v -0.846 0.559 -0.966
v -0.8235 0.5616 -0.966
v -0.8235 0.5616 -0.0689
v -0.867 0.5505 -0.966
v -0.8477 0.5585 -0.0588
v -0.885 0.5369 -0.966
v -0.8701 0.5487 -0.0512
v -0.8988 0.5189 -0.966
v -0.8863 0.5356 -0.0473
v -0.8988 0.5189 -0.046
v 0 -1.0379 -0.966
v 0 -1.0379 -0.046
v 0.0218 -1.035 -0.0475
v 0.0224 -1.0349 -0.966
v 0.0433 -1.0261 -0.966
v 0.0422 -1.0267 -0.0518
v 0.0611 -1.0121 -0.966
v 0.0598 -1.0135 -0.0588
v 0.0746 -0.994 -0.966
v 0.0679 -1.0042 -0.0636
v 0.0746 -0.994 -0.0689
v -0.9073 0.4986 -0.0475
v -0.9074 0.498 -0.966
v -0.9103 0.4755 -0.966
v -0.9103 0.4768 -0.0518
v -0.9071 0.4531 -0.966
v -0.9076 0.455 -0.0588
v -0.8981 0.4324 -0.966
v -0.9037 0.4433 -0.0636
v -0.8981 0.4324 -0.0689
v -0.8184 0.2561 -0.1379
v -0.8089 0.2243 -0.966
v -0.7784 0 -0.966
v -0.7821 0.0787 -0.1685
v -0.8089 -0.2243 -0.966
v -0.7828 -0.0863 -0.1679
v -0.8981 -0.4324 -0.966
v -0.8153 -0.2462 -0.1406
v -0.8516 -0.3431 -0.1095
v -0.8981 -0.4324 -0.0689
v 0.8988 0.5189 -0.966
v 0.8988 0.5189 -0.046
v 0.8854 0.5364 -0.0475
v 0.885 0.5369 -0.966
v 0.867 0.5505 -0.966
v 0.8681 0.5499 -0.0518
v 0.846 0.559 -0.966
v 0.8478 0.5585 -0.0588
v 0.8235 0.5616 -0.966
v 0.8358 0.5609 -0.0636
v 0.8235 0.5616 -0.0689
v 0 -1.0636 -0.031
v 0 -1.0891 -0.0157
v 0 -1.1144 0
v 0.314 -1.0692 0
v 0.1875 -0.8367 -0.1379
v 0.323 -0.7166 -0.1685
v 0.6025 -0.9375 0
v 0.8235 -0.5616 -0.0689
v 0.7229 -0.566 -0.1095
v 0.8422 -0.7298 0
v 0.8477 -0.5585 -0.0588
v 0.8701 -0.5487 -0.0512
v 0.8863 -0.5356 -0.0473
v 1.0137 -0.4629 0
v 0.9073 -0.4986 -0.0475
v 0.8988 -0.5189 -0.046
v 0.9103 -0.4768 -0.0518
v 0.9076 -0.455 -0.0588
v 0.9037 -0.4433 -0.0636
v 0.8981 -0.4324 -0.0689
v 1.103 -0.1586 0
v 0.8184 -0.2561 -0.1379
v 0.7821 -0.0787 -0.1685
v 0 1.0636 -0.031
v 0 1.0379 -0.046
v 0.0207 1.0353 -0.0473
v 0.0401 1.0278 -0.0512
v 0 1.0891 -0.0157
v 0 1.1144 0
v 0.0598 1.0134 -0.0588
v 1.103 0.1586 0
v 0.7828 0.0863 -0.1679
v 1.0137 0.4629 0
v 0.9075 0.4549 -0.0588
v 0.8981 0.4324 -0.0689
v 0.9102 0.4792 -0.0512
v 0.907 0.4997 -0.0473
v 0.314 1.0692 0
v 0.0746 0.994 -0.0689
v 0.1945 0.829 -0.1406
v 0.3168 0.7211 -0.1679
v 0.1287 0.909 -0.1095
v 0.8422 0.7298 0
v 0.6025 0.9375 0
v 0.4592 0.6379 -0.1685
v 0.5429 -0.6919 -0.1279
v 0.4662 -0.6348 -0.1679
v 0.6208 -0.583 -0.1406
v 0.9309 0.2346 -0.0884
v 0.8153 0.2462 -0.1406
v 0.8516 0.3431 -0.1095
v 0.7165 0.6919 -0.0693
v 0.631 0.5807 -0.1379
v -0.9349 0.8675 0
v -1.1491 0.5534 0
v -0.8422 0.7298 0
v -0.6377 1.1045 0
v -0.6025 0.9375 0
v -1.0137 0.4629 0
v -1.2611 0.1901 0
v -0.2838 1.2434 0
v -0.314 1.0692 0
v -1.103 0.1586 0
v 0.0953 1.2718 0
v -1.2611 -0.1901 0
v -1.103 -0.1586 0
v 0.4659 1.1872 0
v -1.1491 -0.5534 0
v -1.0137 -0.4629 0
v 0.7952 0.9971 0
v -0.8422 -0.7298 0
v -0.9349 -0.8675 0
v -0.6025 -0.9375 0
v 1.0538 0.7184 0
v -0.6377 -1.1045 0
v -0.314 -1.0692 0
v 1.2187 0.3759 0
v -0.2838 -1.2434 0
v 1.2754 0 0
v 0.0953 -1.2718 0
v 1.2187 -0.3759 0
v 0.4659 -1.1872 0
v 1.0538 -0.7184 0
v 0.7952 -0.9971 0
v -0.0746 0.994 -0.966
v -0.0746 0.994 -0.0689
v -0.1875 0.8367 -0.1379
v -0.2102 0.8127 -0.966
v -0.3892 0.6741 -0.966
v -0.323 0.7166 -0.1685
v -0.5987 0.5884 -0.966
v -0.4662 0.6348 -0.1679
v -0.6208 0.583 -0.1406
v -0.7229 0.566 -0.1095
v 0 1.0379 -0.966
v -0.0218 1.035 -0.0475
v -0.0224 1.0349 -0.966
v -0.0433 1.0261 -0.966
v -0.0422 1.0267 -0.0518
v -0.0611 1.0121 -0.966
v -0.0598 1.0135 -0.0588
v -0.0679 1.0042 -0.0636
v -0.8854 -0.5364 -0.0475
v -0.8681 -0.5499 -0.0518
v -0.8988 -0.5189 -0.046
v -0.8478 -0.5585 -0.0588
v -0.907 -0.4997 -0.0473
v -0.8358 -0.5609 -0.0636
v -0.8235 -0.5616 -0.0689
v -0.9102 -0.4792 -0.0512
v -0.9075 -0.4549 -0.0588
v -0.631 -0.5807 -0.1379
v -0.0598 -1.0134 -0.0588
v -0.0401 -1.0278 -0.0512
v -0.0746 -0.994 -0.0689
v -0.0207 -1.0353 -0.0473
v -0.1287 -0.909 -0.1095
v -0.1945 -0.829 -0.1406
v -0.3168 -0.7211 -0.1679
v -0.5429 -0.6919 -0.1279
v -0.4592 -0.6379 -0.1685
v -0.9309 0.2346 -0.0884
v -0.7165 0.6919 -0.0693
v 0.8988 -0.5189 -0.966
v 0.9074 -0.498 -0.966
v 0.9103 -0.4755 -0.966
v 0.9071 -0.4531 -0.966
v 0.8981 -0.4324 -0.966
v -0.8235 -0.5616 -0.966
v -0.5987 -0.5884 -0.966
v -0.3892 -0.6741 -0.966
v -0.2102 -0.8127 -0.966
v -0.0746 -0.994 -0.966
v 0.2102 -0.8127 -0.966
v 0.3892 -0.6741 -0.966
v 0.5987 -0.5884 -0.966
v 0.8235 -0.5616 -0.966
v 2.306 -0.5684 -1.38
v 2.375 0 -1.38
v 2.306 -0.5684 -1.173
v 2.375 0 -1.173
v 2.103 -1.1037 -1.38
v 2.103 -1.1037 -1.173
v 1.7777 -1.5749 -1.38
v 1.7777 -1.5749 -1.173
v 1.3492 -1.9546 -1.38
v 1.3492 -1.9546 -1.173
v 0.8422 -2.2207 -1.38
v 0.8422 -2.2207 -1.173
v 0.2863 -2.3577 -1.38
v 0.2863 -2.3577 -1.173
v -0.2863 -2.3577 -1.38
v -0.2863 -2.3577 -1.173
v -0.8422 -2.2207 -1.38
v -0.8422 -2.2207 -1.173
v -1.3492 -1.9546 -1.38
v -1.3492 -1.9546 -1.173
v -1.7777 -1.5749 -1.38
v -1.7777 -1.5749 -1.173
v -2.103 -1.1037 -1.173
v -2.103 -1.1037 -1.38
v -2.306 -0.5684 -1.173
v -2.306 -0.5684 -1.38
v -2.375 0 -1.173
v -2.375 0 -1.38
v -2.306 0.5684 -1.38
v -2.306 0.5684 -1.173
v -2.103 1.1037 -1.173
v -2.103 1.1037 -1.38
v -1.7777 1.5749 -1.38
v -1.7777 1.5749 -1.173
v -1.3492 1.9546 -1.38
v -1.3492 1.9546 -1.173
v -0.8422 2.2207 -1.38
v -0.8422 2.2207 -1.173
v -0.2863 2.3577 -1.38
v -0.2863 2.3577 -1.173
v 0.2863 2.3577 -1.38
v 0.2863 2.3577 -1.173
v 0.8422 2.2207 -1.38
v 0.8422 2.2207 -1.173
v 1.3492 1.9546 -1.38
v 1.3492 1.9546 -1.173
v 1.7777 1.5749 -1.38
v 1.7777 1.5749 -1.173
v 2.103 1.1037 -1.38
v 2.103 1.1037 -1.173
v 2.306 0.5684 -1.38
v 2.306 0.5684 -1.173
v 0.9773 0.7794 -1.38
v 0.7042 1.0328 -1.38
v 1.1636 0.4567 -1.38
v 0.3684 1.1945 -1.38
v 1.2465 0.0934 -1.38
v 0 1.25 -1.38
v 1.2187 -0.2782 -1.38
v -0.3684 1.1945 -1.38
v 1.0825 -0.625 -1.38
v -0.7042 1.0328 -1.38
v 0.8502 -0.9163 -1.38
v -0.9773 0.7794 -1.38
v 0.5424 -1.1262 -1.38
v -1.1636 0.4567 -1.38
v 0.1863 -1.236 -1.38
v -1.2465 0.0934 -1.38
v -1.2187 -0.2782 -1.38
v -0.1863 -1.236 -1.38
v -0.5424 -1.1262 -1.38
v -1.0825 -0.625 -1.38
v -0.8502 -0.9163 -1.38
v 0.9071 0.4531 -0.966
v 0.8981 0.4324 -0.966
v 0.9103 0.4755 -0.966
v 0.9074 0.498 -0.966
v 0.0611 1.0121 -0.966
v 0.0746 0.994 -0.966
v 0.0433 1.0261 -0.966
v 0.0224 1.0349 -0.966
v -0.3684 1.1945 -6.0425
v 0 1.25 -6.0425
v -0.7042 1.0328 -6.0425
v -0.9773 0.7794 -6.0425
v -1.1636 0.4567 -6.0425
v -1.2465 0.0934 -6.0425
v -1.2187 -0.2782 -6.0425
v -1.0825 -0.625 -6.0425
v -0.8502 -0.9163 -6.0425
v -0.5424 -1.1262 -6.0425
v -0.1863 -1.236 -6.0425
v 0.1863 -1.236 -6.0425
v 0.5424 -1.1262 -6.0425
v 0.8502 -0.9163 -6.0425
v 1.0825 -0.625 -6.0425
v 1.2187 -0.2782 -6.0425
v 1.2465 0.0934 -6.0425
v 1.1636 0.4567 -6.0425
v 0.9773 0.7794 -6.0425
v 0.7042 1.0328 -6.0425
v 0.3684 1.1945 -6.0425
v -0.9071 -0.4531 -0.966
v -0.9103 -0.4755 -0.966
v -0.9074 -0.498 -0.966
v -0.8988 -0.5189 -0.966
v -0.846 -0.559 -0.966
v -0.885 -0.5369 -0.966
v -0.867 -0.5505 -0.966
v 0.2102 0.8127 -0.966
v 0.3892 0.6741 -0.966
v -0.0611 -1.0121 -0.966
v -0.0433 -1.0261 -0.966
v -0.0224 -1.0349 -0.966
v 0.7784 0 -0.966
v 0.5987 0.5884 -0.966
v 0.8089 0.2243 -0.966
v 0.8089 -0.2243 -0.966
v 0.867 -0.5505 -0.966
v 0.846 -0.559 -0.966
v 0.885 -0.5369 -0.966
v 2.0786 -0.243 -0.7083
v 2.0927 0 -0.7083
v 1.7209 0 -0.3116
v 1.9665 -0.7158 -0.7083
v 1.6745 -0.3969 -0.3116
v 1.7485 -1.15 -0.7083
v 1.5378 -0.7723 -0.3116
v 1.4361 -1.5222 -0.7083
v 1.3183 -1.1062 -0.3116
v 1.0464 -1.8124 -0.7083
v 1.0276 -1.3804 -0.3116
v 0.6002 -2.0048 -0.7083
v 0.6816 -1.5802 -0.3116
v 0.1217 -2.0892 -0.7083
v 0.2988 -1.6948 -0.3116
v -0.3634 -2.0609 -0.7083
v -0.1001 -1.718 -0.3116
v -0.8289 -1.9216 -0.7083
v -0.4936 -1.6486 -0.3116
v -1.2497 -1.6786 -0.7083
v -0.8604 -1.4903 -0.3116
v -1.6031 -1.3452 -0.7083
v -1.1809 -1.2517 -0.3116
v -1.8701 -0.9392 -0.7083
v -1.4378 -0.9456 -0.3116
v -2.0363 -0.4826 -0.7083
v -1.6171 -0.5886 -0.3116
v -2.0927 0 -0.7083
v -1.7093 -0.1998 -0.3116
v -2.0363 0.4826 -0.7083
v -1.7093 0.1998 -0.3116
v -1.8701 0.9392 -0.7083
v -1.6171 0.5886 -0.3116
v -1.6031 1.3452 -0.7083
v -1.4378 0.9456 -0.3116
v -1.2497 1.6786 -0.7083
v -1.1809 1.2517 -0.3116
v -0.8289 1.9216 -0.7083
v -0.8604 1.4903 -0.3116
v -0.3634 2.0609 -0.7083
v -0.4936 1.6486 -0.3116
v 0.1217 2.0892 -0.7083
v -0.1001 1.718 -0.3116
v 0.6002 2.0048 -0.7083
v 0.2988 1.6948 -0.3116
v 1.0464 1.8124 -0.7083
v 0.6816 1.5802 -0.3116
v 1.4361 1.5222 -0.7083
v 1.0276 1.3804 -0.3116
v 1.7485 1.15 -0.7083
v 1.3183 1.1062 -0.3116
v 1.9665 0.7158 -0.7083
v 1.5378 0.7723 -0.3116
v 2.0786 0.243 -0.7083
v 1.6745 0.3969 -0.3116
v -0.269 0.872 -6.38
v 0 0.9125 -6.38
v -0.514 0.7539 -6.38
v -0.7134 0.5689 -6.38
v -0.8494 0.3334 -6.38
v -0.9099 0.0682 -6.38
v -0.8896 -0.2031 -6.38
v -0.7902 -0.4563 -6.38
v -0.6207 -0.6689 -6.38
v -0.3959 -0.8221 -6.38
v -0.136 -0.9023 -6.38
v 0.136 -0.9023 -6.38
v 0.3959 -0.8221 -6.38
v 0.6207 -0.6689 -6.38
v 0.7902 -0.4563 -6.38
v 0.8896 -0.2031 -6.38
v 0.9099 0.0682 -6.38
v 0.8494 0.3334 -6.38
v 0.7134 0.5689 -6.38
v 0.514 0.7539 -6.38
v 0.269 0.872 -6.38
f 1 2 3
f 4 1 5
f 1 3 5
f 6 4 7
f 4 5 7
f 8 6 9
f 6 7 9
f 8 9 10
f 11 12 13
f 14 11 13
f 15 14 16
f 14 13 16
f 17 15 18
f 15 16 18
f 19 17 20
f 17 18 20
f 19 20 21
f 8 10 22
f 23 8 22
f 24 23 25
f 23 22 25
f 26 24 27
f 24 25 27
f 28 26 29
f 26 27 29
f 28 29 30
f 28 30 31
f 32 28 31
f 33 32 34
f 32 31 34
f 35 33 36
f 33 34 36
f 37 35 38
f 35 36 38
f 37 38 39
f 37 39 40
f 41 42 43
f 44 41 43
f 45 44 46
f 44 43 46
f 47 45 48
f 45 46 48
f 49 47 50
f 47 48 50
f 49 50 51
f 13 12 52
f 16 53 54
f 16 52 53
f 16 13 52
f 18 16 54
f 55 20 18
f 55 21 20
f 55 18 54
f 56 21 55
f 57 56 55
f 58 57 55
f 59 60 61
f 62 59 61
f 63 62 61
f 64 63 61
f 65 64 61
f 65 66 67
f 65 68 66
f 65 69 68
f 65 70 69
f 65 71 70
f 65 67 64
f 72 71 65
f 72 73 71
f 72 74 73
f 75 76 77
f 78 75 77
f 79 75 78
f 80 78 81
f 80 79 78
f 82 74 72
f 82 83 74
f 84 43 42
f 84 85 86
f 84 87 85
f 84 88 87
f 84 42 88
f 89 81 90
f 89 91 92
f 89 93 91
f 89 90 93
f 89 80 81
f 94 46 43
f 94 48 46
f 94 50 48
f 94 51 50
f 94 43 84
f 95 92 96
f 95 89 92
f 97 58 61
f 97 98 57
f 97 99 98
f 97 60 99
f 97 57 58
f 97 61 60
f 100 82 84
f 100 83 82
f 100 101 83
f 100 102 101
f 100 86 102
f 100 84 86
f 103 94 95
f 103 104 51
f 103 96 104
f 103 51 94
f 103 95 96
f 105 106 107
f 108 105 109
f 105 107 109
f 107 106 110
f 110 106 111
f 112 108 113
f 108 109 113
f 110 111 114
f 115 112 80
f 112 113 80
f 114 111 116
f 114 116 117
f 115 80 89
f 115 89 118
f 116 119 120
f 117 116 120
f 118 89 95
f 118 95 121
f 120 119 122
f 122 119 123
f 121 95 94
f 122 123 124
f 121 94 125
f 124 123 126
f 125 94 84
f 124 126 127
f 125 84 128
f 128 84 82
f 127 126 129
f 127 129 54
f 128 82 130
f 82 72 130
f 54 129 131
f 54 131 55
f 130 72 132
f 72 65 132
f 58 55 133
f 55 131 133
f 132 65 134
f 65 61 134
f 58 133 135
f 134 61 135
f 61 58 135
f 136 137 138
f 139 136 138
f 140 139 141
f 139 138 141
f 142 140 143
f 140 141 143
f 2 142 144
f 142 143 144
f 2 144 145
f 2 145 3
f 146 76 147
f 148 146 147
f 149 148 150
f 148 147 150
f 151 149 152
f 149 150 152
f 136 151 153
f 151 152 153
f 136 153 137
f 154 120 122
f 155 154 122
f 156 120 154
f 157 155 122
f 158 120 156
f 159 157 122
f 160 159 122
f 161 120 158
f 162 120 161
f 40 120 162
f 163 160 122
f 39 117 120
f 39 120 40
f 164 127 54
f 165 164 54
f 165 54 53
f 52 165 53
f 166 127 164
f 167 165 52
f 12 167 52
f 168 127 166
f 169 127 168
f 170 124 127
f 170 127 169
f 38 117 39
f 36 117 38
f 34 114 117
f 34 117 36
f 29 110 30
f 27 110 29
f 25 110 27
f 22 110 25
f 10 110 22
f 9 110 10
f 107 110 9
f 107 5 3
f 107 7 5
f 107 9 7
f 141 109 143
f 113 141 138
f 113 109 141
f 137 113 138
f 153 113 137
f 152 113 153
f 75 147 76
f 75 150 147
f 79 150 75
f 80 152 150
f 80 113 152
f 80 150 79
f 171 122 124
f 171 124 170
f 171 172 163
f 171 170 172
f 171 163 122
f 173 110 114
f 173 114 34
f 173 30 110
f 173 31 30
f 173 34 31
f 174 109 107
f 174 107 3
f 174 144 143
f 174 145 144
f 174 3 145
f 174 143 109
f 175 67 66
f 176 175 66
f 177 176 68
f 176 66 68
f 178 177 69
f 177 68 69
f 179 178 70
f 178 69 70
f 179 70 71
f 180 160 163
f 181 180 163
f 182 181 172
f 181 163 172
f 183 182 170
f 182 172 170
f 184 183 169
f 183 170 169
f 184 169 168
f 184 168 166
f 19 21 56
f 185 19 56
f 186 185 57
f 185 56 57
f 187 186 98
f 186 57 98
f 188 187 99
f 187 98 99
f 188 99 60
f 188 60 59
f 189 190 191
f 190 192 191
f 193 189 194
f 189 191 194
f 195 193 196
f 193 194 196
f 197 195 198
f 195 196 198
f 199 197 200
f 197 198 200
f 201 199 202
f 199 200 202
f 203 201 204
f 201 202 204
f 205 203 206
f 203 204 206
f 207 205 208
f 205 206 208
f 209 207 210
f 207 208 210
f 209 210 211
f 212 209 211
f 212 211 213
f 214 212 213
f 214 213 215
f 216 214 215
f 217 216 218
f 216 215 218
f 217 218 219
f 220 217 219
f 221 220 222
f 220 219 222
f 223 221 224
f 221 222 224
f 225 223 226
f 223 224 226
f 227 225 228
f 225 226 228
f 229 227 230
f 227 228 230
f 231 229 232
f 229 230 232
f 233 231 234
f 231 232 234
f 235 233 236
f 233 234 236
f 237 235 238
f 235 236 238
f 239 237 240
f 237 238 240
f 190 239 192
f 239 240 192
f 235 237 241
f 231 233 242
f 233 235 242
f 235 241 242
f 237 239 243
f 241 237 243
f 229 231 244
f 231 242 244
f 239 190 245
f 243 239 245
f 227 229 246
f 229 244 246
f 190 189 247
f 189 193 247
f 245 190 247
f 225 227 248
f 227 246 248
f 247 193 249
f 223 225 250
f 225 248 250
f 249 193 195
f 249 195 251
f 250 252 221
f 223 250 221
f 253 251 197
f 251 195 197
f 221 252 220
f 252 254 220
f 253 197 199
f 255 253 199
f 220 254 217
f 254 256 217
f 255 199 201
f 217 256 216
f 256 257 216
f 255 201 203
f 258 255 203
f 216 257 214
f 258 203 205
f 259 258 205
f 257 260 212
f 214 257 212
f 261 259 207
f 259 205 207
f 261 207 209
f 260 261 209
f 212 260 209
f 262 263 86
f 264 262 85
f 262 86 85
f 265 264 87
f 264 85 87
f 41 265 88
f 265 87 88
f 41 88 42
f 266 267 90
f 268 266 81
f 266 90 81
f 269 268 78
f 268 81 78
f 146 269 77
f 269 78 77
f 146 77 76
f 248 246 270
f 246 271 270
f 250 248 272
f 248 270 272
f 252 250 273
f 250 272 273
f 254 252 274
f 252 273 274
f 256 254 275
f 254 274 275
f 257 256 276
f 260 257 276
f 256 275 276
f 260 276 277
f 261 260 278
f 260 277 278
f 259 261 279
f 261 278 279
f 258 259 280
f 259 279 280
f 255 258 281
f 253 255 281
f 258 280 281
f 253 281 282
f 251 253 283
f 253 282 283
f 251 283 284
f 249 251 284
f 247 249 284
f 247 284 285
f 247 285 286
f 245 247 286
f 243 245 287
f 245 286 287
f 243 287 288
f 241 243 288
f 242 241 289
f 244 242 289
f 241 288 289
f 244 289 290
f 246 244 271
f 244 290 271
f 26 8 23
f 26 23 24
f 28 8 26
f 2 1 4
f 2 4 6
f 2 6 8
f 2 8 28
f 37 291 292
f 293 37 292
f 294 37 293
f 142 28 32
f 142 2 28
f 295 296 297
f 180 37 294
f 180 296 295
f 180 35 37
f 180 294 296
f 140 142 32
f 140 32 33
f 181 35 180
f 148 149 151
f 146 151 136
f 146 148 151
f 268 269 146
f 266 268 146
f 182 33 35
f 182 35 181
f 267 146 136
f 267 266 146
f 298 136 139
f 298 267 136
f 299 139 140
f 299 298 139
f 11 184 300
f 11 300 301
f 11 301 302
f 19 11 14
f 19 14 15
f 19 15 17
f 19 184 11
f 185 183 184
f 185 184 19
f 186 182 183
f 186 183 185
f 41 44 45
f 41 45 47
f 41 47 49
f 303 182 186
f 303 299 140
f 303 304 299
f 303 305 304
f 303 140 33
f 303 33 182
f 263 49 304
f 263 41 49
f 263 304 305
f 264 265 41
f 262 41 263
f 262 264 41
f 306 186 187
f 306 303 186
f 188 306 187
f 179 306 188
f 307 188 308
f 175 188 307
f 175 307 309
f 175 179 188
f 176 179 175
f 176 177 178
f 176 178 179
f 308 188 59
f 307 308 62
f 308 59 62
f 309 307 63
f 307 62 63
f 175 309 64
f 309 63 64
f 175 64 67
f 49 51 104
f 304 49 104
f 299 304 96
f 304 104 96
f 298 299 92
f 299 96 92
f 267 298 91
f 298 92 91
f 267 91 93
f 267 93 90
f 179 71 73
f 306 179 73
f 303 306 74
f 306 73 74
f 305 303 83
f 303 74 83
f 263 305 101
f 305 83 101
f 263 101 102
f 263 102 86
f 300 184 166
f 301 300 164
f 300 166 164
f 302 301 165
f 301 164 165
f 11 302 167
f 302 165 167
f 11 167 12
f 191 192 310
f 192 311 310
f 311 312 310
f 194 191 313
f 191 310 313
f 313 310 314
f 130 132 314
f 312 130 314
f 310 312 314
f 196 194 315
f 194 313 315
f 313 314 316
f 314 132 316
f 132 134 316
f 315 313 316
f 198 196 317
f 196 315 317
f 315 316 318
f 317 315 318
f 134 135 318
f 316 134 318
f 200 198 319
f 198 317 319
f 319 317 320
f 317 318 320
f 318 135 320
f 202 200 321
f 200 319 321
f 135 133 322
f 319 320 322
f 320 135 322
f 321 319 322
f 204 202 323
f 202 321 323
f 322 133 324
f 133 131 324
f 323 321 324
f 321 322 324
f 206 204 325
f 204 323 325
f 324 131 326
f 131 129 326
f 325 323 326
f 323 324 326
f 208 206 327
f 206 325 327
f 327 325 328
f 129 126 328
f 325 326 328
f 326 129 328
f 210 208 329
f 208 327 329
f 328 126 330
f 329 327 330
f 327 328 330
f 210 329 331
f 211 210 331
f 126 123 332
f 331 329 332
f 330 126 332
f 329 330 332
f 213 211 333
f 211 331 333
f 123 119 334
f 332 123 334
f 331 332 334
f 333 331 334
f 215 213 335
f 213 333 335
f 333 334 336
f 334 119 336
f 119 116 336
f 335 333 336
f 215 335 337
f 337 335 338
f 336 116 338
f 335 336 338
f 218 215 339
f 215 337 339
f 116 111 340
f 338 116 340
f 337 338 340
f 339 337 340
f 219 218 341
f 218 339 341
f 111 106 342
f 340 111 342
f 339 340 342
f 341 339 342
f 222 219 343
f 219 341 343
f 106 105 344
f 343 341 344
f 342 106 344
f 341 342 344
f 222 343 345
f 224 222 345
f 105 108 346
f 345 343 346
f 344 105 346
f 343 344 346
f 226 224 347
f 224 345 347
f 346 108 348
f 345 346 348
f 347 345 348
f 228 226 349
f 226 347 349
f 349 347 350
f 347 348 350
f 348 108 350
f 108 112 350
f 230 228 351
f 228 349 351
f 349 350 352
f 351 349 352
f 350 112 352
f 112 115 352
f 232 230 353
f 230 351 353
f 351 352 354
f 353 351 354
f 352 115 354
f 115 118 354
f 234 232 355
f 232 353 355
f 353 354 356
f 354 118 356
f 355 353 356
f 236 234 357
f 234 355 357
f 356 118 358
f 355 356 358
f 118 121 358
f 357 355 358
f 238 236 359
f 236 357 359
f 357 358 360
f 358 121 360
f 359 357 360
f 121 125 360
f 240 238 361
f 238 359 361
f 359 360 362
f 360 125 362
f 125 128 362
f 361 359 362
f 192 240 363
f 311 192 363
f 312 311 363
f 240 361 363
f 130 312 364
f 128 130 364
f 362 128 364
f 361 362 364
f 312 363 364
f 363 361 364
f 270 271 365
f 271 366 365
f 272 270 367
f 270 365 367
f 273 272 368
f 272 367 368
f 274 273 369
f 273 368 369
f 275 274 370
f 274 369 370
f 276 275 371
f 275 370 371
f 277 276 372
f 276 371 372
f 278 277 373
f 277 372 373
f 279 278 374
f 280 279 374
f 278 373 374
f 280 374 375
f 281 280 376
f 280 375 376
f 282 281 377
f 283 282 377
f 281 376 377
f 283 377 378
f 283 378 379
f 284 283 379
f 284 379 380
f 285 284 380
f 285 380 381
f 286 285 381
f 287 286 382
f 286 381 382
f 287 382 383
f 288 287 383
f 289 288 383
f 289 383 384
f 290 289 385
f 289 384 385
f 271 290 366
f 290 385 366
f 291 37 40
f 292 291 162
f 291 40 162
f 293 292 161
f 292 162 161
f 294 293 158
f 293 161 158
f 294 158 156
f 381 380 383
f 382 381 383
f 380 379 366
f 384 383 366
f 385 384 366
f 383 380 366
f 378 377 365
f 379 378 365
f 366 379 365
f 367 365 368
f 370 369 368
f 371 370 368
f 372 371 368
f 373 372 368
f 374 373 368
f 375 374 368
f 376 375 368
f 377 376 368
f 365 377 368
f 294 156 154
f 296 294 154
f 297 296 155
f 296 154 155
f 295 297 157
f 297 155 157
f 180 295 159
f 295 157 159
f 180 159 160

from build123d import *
from build123d.topology import SkipClean

# Parameters (mm, degrees)
CUT_EXTRUDE1_DEPTH = 0.966
CIRPATTERN1_COUNT  = 6


with BuildPart() as part:
    # Sketch2 → Revolve1 (revolve)
    with BuildSketch(Plane(origin=(0, 0, 0), x_dir=(0, 0, -1), z_dir=(1, 0, 0))):
        Polygon((1.38, 1.25), (6.0425, 1.25), (6.38, 0.9125), (6.38, 0), (1.38, 0), align=None)
    revolve(axis=Axis((0, 0, -6.38), (0, 0, 1)))


with BuildPart() as body_2:
    # Sketch3 → Revolve2 (revolve)
    with BuildSketch(Plane(origin=(0, 0, 0), x_dir=(0, 0, -1), z_dir=(1, 0, 0))):
        with BuildLine():
            Line((1.38, 0), (1.38, 2.375))
            Line((1.38, 2.375), (1.173, 2.375))
            ThreePointArc((1.173, 2.375), (0.500332222, 1.917105021), (0, 1.275375))
            Line((0, 1.275375), (0, 0))
            Line((0, 0), (1.38, 0))
        make_face()
    revolve(axis=Axis((0, 0, 0), (0, 0, -1)))

    # Combine1: union part
    add(part.part)

    # Sketch4 → Cut-Extrude1 (cut)
    with BuildSketch(Plane.XY):
        with BuildLine():
            Line((0, 0), (-0.898826116, 0.5189375))
            ThreePointArc((-0.898826116, 0.5189375), (-0.910259221, 0.475549675), (-0.89810803, 0.432357455))
            ThreePointArc((-0.89810803, 0.432357455), (-0.77840625, 0), (-0.89810803, -0.432357455))
            ThreePointArc((-0.89810803, -0.432357455), (-0.910259221, -0.475549675), (-0.898826116, -0.5189375))
            Line((-0.898826116, -0.5189375), (0, 0))
        make_face()
    cut_extrude1 = extrude(amount=-CUT_EXTRUDE1_DEPTH, mode=Mode.SUBTRACT)

    # CirPattern1: Cut-Extrude1 ×6 about axis
    cirpattern1_axis = Axis((0, 0, -6.38), (0, 0, -1))
    for i in range(1, CIRPATTERN1_COUNT):
        add(cut_extrude1.rotate(cirpattern1_axis, i * 360 / CIRPATTERN1_COUNT), mode=Mode.SUBTRACT)

    # Sketch5 → Cut-Revolve1 (revolve, cut)
    with SkipClean():  # the faces are left unmerged after this step: merging them gives an invalid solid
        with BuildSketch(Plane(origin=(0, 0, 0), x_dir=(0, 0, -1), z_dir=(1, 0, 0))):
            with BuildLine():
                Line((-1.767310001, 2.089310001), (-1.767310001, -2.089310001))
                ThreePointArc((-1.767310001, -2.089310001), (0.322, 0), (-1.767310001, 2.089310001))
            make_face()
        revolve(axis=Axis((0, 2.089310001, 1.767310001), (0, -1, 0)), mode=Mode.SUBTRACT)


solid = body_2.part
